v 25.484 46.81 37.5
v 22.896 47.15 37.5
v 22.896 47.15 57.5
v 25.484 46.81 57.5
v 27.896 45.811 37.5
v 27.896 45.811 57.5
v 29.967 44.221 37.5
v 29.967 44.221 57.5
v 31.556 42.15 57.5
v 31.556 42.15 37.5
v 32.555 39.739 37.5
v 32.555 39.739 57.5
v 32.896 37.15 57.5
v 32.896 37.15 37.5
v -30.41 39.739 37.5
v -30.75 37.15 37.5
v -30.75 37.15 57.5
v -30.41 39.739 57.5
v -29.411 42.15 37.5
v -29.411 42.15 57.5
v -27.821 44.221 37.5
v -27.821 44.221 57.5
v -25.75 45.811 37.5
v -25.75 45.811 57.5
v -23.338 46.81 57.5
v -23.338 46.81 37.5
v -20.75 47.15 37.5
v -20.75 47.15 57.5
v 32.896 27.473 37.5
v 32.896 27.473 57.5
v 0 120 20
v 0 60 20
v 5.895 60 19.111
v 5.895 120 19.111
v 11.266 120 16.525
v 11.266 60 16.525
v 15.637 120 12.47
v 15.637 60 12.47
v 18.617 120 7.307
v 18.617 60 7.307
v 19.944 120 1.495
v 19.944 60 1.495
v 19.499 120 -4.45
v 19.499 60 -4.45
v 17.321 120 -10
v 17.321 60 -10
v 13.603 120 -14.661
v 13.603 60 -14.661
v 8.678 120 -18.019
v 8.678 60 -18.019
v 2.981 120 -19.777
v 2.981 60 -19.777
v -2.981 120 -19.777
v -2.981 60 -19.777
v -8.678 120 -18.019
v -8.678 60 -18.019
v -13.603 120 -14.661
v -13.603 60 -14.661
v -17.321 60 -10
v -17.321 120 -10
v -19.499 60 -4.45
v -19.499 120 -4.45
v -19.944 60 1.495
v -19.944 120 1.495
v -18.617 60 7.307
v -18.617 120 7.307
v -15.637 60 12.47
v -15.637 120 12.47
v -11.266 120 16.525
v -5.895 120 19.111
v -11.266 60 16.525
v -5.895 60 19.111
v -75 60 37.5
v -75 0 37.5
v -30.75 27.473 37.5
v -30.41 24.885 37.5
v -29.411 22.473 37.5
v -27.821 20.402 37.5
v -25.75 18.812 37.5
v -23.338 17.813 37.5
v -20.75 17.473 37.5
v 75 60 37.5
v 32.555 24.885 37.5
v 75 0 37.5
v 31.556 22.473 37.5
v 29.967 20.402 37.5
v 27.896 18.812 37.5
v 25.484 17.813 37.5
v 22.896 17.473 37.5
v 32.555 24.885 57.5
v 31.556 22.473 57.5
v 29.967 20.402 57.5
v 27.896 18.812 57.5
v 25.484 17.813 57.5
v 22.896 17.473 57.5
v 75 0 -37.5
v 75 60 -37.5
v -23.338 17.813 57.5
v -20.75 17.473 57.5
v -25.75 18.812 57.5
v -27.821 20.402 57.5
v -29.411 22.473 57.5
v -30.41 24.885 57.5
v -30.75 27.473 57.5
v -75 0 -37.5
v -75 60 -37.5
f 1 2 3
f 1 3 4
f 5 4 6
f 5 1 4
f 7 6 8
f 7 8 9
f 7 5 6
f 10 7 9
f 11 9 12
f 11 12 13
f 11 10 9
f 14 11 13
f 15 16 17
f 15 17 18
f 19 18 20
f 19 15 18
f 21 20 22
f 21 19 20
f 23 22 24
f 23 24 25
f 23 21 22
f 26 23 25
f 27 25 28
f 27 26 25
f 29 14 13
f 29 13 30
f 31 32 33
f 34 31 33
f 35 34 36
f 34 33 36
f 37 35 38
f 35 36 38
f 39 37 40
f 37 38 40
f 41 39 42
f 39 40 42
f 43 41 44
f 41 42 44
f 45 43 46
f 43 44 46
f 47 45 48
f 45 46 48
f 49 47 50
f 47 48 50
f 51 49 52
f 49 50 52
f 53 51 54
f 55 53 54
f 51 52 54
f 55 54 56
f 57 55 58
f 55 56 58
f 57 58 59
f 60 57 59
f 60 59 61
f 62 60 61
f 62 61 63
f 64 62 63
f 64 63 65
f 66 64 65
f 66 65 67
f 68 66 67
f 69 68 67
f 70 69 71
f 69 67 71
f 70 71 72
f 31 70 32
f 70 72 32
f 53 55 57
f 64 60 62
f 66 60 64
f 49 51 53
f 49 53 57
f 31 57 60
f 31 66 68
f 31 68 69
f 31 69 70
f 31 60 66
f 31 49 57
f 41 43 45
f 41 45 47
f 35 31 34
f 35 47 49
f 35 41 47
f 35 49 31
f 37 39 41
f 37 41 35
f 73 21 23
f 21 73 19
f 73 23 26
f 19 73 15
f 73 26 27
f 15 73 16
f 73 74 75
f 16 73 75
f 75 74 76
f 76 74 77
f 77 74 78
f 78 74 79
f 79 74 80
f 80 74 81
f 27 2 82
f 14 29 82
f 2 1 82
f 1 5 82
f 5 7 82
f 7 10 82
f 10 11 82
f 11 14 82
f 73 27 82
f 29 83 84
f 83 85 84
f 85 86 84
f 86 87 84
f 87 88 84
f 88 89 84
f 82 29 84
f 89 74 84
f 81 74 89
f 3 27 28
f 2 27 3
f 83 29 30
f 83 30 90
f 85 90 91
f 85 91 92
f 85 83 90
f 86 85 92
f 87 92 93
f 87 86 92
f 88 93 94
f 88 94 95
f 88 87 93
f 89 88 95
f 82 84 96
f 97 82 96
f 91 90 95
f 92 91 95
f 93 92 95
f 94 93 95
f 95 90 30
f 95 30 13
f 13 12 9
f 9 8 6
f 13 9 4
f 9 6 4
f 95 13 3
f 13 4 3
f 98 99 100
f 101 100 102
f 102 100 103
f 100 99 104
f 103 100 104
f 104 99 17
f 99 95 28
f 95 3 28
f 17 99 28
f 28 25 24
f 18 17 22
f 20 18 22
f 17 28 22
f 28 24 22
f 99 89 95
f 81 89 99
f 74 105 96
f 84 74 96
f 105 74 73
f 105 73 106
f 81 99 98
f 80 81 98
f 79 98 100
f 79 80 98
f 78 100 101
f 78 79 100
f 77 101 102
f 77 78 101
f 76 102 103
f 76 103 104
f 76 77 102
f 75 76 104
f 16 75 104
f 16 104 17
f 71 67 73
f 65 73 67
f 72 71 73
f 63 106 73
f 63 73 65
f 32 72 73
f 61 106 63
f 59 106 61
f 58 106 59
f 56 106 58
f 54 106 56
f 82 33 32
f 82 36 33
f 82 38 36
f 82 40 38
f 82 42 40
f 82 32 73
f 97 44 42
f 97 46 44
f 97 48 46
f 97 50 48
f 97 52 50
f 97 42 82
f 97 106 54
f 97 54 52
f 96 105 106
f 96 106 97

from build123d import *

# Parameters (mm, degrees)
SKETCH1_W           = 150
SKETCH1_H           = 75
BOSS_EXTRUDE1_DEPTH = 60
SKETCH2_R           = 20
BOSS_EXTRUDE2_DEPTH = 60
BOSS_EXTRUDE3_DEPTH = 20


with BuildPart() as part:
    # Sketch1 → Boss-Extrude1 (new body)
    with BuildSketch(Plane(origin=(0, 0, 0), x_dir=(1, 0, 0), z_dir=(0, 1, 0))):
        Rectangle(SKETCH1_W, SKETCH1_H)
    extrude(amount=BOSS_EXTRUDE1_DEPTH)

    # Sketch2 → Boss-Extrude2 (add)
    with BuildSketch(Plane(origin=(0, 60, 0), x_dir=(1, 0, 0), z_dir=(0, 1, 0))):
        with Locations(Location((0, 0, 0), (0, 0, 270))):
            Circle(SKETCH2_R)
    extrude(amount=BOSS_EXTRUDE2_DEPTH)

    # Sketch3 → Boss-Extrude3 (add)
    with BuildSketch(Plane.XY.offset(37.5)):
        with BuildLine():
            Line((-20.750294914, 47.150331809), (22.895664326, 47.150331809))
            ThreePointArc((22.895664326, 47.150331809), (29.966732138, 44.221399621), (32.895664326, 37.150331809))
            Line((32.895664326, 37.150331809), (32.895664326, 27.472721601))
            ThreePointArc((32.895664326, 27.472721601), (29.966732138, 20.401653789), (22.895664326, 17.472721601))
            Line((22.895664326, 17.472721601), (-20.750294914, 17.472721601))
            ThreePointArc((-20.750294914, 17.472721601), (-27.821362726, 20.401653789), (-30.750294914, 27.472721601))
            Line((-30.750294914, 27.472721601), (-30.750294914, 37.150331809))
            ThreePointArc((-30.750294914, 37.150331809), (-27.821362726, 44.221399621), (-20.750294914, 47.150331809))
        make_face()
    extrude(amount=BOSS_EXTRUDE3_DEPTH)


solid = part.part
